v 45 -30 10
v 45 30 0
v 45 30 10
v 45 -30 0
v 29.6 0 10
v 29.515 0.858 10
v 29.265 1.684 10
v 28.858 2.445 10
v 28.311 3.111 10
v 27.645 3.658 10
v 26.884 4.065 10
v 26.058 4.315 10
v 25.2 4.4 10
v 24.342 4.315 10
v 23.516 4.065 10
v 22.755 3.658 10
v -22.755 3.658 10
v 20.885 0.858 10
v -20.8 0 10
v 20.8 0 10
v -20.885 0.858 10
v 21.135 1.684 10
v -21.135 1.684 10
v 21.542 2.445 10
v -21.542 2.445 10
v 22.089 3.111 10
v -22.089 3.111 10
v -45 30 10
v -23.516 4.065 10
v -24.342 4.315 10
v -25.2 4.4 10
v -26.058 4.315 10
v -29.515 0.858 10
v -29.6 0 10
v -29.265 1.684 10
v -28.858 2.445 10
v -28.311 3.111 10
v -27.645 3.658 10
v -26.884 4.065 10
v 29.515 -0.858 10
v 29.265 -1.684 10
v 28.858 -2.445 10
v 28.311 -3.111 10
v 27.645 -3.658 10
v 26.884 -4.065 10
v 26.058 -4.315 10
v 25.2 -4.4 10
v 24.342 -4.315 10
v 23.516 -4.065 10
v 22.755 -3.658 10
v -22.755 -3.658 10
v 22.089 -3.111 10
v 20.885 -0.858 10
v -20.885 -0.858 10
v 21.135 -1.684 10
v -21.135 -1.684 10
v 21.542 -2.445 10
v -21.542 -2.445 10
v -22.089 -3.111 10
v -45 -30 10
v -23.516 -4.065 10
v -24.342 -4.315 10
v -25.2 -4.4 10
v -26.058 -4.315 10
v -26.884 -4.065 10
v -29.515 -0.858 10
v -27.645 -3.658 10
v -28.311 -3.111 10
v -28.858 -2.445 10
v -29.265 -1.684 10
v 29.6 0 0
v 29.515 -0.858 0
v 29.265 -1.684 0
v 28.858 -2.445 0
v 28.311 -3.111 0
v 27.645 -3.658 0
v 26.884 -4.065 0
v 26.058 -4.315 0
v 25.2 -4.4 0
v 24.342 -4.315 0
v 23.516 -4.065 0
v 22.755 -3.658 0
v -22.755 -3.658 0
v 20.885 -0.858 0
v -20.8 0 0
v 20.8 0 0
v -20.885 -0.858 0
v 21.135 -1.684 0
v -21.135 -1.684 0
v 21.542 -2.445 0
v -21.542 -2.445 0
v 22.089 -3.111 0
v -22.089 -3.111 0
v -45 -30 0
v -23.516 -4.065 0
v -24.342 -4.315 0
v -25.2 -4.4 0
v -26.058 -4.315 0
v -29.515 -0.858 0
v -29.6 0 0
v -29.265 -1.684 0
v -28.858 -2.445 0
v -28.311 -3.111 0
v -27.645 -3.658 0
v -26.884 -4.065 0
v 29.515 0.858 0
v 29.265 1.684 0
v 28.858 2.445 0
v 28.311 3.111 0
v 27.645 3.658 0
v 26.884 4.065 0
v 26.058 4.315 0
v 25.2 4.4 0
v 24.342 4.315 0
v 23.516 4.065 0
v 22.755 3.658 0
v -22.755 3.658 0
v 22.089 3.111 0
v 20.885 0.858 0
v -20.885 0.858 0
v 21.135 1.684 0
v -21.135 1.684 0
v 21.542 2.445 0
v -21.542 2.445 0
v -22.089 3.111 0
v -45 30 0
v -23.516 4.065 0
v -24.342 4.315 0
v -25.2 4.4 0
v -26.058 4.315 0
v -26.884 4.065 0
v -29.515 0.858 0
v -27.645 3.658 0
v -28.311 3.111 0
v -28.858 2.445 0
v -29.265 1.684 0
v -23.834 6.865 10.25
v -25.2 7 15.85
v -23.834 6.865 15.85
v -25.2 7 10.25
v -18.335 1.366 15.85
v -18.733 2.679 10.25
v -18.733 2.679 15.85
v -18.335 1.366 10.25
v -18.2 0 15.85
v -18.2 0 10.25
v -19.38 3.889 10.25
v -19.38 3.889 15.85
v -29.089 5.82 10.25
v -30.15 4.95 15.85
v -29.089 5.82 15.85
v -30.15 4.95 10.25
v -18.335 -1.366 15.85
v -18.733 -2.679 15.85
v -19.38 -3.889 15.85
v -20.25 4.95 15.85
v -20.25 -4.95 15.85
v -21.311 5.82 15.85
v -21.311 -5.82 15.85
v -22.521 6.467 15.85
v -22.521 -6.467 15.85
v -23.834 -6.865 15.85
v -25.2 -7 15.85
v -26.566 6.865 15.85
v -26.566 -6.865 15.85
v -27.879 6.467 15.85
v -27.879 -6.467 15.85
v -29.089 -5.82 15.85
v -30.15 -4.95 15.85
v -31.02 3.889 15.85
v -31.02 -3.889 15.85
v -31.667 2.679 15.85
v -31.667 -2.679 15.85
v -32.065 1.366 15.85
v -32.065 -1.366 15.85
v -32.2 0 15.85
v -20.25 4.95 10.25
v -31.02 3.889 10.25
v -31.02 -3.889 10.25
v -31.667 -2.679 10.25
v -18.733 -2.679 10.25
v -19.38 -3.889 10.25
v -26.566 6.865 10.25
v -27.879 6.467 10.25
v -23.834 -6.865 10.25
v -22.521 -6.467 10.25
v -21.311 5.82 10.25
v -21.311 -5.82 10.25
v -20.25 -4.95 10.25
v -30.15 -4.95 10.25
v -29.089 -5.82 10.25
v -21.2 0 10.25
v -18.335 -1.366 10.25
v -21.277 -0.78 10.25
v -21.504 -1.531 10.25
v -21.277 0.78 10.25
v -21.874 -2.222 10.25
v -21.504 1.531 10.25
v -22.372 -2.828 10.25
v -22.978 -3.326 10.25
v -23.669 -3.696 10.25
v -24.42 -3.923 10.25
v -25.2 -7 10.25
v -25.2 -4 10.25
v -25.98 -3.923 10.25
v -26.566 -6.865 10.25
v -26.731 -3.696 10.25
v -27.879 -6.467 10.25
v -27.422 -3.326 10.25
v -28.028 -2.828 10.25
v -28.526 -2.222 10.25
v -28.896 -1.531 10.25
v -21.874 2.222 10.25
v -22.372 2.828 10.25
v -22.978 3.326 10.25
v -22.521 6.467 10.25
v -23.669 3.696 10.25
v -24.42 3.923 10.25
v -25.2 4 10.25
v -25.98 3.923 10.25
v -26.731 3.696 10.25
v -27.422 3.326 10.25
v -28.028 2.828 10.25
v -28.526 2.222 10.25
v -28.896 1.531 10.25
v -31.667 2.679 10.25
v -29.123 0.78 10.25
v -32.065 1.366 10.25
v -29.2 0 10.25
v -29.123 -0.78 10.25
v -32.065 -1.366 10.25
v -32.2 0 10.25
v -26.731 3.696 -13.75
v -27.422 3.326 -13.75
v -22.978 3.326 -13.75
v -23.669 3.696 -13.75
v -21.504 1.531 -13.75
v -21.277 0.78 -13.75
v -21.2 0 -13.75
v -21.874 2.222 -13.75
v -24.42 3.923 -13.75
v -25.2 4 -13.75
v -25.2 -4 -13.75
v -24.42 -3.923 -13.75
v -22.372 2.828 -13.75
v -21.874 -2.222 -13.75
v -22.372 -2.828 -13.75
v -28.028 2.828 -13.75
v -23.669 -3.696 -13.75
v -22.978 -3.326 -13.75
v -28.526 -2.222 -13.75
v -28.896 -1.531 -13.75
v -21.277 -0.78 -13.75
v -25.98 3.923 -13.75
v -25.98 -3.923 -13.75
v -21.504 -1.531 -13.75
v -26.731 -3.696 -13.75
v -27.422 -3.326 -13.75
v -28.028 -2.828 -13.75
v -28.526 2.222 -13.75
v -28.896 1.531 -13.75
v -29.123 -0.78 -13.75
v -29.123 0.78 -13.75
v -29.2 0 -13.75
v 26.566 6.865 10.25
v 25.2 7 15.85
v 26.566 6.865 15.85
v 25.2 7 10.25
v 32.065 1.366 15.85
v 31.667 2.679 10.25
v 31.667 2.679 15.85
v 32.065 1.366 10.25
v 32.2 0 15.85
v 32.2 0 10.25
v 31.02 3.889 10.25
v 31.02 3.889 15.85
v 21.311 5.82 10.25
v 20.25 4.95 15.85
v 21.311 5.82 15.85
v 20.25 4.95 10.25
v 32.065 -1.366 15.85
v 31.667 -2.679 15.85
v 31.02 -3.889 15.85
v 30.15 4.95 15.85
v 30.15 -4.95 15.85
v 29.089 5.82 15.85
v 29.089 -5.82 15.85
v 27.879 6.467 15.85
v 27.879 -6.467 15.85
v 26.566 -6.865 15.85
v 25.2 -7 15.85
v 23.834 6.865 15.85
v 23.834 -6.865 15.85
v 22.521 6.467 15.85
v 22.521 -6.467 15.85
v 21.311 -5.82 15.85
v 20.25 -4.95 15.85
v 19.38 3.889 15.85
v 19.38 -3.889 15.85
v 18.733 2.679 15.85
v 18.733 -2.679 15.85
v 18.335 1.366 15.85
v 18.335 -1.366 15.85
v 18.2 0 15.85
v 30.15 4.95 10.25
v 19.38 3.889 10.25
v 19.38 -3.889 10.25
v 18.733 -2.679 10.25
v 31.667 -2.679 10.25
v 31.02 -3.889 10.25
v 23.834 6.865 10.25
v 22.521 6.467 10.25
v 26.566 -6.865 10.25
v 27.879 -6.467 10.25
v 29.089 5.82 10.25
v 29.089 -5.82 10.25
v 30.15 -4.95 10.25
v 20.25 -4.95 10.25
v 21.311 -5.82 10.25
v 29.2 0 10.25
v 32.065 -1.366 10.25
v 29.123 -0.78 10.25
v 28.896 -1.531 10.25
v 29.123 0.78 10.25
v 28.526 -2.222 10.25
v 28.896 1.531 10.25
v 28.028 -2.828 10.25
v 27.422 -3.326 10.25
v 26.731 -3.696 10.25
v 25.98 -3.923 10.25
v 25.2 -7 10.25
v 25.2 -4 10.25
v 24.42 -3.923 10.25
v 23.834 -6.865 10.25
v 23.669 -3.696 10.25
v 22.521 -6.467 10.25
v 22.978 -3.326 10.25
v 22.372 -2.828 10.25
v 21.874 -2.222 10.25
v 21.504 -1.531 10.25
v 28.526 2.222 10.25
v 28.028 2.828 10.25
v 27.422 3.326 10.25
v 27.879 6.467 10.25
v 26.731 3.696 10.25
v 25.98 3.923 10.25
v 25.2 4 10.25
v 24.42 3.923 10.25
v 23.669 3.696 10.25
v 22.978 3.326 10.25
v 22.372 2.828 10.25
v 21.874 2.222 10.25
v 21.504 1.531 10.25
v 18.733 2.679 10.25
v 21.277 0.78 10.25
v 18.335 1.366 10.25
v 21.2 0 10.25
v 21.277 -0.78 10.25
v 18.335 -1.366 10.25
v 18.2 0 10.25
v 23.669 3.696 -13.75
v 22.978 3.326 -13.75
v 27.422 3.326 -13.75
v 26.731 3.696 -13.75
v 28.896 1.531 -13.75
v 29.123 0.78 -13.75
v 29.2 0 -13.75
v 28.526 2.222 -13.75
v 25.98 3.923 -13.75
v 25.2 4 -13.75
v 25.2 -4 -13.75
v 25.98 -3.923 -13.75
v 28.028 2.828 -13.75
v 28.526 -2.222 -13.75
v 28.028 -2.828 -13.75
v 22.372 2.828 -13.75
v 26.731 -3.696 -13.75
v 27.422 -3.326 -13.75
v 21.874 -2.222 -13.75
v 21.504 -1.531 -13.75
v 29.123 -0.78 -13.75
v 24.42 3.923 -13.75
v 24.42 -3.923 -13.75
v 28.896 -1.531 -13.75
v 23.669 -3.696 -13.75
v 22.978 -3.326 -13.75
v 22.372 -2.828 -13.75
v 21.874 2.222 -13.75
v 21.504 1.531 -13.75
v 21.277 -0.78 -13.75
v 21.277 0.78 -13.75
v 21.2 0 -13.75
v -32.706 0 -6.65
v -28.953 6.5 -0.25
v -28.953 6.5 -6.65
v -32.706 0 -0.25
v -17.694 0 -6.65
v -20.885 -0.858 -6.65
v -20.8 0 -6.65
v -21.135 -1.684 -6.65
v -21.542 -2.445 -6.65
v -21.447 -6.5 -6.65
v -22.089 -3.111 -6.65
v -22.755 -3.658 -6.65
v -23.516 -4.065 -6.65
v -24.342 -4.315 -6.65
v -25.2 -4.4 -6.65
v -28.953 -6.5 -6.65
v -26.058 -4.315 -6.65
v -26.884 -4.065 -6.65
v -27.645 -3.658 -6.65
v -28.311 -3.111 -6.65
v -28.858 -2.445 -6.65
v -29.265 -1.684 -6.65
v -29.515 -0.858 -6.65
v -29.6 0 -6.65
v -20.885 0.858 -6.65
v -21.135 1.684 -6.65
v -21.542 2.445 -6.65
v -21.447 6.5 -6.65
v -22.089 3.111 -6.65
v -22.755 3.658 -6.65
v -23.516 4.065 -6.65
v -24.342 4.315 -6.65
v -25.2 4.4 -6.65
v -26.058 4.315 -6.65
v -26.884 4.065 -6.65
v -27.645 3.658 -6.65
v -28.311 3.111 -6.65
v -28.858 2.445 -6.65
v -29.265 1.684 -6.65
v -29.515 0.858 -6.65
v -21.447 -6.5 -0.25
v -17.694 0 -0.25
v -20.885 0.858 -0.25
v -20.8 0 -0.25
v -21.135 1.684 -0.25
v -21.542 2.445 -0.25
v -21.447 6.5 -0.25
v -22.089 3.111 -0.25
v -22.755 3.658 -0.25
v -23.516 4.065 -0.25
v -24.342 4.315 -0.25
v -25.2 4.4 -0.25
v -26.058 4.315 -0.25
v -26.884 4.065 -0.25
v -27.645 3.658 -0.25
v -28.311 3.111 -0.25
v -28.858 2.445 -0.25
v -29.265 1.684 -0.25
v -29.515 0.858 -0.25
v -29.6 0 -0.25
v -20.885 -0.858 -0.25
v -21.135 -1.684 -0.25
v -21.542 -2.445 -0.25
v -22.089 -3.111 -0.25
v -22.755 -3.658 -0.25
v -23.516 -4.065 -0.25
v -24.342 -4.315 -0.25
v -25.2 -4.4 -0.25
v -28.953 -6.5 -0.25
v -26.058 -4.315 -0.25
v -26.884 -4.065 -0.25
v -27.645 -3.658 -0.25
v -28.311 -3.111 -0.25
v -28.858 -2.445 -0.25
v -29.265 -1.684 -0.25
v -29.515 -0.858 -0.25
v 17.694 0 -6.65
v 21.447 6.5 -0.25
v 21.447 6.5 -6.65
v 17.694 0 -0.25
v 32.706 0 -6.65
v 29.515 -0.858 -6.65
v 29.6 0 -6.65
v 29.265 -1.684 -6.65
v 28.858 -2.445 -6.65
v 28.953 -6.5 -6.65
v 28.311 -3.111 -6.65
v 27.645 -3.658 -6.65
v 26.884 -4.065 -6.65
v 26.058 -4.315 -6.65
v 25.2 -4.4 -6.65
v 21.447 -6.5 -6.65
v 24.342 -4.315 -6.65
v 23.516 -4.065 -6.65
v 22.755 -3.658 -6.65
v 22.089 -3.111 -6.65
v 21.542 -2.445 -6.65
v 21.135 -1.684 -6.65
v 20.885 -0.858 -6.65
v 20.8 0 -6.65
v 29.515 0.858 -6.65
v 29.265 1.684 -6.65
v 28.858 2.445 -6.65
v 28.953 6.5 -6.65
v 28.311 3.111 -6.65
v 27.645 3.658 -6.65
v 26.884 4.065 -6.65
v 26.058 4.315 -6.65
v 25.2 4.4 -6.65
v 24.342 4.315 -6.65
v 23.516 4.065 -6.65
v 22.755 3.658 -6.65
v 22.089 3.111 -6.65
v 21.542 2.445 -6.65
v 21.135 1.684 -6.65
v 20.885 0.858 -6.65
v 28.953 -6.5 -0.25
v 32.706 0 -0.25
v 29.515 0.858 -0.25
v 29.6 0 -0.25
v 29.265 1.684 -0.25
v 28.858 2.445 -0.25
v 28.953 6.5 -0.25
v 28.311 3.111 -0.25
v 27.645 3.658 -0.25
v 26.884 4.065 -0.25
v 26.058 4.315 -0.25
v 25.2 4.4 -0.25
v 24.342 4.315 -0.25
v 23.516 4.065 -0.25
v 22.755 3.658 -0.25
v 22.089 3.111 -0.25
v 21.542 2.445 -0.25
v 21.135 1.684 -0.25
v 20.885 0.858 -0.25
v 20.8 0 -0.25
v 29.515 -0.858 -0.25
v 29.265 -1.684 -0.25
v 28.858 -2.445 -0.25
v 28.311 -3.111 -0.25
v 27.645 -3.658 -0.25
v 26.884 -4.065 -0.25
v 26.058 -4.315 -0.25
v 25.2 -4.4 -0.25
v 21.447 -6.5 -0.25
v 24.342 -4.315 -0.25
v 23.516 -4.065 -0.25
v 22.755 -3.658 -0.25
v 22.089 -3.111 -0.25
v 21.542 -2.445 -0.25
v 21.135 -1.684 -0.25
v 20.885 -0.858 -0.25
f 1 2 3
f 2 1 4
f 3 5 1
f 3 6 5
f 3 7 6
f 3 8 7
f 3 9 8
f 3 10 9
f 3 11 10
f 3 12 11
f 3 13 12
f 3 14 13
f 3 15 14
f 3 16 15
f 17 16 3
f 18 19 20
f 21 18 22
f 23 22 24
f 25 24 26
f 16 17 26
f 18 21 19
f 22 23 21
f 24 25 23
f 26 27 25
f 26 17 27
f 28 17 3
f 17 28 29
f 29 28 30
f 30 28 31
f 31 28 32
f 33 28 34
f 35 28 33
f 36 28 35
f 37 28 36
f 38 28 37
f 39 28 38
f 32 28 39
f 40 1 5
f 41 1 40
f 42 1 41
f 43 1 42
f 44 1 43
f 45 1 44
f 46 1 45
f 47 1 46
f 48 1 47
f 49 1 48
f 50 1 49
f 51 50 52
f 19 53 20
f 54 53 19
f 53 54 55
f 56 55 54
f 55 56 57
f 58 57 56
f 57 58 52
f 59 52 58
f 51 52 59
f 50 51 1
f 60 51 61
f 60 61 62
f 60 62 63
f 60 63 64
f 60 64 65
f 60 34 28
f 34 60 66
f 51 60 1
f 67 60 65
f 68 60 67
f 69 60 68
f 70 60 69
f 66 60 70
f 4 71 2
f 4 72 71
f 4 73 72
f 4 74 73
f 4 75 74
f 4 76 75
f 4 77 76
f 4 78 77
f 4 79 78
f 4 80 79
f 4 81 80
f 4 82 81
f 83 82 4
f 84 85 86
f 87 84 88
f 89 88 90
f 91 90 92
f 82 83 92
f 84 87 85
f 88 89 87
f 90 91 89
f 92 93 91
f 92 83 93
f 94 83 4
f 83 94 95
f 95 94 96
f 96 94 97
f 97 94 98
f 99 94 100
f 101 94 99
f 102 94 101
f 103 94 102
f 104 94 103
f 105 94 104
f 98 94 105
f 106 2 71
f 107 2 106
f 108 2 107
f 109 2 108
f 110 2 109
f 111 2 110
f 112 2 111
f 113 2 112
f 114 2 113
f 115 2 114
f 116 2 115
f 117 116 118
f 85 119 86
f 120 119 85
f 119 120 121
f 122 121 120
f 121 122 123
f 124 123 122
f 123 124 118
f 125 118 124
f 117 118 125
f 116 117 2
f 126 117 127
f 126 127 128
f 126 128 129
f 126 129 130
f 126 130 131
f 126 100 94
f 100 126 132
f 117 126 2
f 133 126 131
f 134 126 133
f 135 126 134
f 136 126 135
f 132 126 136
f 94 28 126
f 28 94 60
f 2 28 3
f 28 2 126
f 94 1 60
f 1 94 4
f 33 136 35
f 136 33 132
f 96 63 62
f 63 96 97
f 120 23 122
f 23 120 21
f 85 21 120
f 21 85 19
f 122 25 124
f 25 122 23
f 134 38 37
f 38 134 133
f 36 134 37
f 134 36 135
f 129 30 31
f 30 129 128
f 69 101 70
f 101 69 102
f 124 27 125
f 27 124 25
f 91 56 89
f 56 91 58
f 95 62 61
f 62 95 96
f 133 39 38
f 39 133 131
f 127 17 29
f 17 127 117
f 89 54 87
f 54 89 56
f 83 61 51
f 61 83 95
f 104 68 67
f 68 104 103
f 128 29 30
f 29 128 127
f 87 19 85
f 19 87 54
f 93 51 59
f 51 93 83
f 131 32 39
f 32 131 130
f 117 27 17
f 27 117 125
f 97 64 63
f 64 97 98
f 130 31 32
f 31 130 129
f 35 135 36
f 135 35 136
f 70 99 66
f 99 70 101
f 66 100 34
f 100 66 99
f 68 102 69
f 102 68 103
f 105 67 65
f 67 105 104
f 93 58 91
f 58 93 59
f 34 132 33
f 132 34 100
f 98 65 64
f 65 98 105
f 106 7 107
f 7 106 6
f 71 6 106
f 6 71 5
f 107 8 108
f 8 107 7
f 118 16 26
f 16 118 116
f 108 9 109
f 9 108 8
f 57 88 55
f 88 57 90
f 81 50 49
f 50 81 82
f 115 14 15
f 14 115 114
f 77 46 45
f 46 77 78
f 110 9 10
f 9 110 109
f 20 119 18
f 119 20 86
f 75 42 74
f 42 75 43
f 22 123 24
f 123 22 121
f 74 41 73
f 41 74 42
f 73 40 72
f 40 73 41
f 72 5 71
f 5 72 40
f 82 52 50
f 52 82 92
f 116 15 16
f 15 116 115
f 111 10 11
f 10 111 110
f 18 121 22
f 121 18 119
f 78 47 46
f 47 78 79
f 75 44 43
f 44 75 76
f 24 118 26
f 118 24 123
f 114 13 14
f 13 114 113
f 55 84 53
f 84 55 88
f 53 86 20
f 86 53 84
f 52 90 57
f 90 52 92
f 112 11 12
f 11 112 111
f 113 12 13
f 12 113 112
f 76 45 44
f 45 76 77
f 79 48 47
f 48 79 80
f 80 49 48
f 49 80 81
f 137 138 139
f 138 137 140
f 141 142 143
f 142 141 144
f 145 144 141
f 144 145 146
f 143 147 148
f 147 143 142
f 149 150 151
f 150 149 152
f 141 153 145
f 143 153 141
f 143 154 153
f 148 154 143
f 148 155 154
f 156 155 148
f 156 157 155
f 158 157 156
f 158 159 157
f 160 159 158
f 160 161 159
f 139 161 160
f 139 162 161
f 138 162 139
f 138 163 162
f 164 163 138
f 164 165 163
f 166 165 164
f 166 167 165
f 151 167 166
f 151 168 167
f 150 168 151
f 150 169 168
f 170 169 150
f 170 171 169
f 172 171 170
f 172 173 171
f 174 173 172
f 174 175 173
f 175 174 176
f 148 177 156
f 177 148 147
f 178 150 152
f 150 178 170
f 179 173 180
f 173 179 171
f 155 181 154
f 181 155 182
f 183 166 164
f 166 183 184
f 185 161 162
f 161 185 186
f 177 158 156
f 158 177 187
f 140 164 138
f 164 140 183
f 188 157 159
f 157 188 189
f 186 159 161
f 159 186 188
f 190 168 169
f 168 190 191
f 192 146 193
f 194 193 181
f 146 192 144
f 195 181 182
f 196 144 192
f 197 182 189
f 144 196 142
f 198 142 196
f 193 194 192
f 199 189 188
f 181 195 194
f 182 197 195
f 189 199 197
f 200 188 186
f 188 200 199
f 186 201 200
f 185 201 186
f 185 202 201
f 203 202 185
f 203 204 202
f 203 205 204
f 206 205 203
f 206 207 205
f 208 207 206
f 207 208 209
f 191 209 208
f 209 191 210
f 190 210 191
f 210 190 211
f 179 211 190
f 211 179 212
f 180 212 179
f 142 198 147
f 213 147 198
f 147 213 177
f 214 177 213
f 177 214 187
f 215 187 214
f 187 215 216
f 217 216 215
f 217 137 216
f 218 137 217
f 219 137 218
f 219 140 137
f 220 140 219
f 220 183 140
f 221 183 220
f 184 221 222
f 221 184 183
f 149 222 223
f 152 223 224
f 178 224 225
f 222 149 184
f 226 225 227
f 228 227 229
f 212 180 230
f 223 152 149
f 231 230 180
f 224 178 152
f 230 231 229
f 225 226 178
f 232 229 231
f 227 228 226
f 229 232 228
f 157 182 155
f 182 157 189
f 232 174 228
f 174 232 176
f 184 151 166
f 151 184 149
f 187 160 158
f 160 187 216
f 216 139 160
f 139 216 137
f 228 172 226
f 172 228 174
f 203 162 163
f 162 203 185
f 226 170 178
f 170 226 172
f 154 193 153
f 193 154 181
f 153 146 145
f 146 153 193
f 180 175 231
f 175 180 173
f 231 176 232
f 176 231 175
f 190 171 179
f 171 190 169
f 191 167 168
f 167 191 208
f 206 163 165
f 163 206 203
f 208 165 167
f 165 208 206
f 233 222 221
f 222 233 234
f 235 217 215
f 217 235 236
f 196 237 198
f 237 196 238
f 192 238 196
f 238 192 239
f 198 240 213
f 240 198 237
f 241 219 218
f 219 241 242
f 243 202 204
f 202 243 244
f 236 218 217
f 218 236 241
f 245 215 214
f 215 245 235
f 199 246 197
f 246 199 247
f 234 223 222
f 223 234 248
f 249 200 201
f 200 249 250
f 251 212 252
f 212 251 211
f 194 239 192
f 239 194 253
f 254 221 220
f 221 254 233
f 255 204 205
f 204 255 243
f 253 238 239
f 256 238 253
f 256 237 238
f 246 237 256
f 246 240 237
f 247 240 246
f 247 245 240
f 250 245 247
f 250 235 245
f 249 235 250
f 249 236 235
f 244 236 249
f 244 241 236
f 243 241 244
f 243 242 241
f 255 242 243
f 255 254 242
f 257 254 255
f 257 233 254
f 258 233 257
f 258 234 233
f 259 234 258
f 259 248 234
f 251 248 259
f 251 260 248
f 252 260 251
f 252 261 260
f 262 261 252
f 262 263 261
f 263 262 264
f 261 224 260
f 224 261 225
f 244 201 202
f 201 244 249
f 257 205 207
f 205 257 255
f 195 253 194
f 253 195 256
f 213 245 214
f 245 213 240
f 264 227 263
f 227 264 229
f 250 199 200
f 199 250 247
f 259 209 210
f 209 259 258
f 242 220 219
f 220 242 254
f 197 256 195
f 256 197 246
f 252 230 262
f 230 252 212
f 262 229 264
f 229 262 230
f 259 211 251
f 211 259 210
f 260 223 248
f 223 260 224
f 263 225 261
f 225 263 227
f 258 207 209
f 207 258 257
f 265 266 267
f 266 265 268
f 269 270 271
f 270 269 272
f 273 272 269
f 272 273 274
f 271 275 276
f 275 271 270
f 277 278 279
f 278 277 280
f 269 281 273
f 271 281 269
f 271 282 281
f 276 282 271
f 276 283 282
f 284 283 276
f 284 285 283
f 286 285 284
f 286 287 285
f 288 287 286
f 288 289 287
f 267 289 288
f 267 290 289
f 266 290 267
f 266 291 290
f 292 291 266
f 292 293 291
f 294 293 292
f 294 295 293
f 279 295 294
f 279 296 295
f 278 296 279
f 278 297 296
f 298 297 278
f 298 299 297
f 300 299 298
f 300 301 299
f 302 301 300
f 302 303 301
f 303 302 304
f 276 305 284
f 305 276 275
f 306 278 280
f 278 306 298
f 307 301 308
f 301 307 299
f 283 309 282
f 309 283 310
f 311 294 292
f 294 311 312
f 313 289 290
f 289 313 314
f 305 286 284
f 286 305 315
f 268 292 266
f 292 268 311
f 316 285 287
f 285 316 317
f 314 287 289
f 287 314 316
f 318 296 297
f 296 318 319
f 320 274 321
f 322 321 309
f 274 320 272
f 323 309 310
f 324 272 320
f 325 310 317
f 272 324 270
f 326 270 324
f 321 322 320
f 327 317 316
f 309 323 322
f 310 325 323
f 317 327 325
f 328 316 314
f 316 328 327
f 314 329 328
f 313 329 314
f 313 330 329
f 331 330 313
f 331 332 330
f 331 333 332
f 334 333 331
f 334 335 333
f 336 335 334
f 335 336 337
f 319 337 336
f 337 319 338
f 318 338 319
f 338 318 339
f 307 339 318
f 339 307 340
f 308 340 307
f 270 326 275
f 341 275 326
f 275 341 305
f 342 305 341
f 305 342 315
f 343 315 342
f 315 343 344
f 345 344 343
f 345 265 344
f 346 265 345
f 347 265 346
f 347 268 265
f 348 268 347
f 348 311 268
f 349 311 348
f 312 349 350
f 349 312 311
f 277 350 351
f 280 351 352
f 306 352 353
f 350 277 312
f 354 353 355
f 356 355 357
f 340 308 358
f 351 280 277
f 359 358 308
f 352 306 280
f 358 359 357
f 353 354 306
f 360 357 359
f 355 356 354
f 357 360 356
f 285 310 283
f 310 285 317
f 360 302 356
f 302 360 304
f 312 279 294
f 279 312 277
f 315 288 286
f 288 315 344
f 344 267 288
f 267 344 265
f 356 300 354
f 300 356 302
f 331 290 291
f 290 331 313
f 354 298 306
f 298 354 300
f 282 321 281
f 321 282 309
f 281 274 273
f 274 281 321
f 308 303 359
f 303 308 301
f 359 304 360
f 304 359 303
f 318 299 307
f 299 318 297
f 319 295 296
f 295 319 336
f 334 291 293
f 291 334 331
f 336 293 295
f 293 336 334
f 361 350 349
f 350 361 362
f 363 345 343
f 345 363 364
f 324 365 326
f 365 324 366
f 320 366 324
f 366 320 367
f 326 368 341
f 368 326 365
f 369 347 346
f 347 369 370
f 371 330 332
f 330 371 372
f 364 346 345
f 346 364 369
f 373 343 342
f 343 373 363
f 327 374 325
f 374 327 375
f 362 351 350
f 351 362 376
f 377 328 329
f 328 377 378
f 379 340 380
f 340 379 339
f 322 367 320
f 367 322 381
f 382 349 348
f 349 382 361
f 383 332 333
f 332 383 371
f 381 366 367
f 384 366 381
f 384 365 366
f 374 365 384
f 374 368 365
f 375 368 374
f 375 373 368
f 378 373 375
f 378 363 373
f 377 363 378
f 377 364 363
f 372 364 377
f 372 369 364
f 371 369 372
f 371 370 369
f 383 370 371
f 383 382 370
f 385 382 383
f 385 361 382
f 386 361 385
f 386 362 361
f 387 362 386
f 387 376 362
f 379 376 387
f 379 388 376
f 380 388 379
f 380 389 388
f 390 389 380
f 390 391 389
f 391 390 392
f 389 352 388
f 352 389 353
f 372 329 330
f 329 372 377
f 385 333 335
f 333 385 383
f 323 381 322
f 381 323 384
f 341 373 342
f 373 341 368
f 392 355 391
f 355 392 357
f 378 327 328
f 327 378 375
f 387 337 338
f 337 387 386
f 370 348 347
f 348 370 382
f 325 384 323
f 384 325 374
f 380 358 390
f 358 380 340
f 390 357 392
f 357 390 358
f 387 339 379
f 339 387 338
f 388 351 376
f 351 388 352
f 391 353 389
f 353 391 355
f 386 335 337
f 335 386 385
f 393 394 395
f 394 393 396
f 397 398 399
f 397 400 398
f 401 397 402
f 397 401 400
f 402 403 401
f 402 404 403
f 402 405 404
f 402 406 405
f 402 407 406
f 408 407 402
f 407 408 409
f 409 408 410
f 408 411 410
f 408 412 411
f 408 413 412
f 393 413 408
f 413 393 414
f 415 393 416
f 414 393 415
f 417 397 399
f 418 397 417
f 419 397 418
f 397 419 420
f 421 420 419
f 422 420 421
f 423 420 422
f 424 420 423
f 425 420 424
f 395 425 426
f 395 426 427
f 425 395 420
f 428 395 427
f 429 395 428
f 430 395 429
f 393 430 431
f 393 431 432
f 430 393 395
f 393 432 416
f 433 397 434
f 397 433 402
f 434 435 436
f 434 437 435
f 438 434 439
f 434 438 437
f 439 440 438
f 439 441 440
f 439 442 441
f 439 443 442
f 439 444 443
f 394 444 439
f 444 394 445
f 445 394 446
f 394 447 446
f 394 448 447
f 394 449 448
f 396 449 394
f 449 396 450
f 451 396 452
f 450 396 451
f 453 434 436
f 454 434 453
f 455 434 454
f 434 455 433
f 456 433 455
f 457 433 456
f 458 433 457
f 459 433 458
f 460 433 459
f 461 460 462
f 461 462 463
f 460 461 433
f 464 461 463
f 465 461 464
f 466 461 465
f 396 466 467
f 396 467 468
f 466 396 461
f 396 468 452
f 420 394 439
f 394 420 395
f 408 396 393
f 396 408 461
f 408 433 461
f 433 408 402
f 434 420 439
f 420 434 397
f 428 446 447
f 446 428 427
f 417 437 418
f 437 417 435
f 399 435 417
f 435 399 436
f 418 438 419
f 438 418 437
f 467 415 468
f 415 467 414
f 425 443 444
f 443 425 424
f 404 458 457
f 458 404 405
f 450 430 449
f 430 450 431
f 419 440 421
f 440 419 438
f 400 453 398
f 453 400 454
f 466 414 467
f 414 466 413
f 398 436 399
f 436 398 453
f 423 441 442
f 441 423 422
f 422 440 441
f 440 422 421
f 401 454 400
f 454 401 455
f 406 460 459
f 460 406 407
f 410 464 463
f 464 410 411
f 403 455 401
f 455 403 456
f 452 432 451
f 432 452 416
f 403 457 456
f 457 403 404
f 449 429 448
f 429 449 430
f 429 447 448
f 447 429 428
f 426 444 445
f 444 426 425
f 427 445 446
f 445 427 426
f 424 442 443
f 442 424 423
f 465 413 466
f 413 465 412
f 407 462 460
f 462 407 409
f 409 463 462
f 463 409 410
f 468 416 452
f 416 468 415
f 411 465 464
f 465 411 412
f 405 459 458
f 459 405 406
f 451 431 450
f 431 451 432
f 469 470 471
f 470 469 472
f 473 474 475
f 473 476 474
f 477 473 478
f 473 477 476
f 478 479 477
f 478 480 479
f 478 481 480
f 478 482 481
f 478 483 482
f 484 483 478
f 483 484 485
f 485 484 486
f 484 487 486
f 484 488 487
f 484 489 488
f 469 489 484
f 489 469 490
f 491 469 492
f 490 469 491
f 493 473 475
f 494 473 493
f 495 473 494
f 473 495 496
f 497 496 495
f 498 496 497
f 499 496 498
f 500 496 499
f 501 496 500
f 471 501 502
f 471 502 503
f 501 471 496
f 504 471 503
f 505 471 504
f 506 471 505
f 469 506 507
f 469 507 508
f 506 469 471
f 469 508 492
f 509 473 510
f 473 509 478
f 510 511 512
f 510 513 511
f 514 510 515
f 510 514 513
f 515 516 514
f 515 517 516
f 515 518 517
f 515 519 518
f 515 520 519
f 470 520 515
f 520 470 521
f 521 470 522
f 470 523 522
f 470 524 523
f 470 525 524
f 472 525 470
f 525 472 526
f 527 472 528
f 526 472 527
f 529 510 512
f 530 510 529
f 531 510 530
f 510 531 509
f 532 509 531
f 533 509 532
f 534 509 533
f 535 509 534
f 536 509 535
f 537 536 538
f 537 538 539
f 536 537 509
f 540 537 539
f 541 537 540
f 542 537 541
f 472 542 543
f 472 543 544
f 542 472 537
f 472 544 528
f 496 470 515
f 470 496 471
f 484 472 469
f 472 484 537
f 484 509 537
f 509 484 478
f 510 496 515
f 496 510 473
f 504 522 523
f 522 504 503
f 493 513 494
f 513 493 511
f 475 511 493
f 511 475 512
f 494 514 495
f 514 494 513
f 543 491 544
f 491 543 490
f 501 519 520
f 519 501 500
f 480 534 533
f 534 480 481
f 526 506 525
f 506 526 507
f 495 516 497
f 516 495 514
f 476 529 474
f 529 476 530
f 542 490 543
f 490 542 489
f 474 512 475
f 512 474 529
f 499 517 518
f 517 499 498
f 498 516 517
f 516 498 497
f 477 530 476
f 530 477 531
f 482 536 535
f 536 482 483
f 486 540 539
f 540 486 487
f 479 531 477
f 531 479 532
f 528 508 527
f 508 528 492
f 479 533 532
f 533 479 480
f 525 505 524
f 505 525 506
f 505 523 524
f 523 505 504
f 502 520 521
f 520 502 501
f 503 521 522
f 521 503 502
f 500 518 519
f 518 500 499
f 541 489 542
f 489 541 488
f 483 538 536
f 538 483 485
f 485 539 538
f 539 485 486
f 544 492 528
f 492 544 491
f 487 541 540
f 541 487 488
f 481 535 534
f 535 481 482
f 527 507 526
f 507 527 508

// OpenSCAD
$fn = 32;

// ------------------------------------------------------------------------
// Bolted plate: 90 x 60 x 10 mm plate, 2 fasteners
// Every part is its own module, assembly() places them once.
// ------------------------------------------------------------------------

// --- part 1 ---
module plate() {
  difference() {
    translate([-45, -30, 0]) cube([90, 60, 10]);
    translate([-25.2, 0, -1]) cylinder(h = 12, d = 8.8);
    translate([25.2, 0, -1]) cylinder(h = 12, d = 8.8);
  }
}

// --- part 2 ---
module bolt1() {
  cylinder(h = 5.6, d = 14);
  translate([0, 0, -24]) cylinder(h = 24, d = 8);
}

// --- part 3 ---
module bolt2() {
  cylinder(h = 5.6, d = 14);
  translate([0, 0, -24]) cylinder(h = 24, d = 8);
}

// --- part 4 ---
module nut1() {
  difference() {
    linear_extrude(height = 6.4) polygon(points = [[7.506, 0], [3.753, 6.5], [-3.753, 6.5], [-7.506, 0], [-3.753, -6.5], [3.753, -6.5]]);
    translate([0, 0, -1]) cylinder(h = 8.4, d = 8.8);
  }
}

// --- part 5 ---
module nut2() {
  difference() {
    linear_extrude(height = 6.4) polygon(points = [[7.506, 0], [3.753, 6.5], [-3.753, 6.5], [-7.506, 0], [-3.753, -6.5], [3.753, -6.5]]);
    translate([0, 0, -1]) cylinder(h = 8.4, d = 8.8);
  }
}

// --- assembly ---
module assembly() {
  translate([0, 0, 0]) rotate([0, 0, 0]) plate();
  translate([-25.2, 0, 10.25]) rotate([0, 0, 0]) bolt1();
  translate([25.2, 0, 10.25]) rotate([0, 0, 0]) bolt2();
  translate([-25.2, 0, -6.65]) rotate([0, 0, 0]) nut1();
  translate([25.2, 0, -6.65]) rotate([0, 0, 0]) nut2();
}

assembly();
